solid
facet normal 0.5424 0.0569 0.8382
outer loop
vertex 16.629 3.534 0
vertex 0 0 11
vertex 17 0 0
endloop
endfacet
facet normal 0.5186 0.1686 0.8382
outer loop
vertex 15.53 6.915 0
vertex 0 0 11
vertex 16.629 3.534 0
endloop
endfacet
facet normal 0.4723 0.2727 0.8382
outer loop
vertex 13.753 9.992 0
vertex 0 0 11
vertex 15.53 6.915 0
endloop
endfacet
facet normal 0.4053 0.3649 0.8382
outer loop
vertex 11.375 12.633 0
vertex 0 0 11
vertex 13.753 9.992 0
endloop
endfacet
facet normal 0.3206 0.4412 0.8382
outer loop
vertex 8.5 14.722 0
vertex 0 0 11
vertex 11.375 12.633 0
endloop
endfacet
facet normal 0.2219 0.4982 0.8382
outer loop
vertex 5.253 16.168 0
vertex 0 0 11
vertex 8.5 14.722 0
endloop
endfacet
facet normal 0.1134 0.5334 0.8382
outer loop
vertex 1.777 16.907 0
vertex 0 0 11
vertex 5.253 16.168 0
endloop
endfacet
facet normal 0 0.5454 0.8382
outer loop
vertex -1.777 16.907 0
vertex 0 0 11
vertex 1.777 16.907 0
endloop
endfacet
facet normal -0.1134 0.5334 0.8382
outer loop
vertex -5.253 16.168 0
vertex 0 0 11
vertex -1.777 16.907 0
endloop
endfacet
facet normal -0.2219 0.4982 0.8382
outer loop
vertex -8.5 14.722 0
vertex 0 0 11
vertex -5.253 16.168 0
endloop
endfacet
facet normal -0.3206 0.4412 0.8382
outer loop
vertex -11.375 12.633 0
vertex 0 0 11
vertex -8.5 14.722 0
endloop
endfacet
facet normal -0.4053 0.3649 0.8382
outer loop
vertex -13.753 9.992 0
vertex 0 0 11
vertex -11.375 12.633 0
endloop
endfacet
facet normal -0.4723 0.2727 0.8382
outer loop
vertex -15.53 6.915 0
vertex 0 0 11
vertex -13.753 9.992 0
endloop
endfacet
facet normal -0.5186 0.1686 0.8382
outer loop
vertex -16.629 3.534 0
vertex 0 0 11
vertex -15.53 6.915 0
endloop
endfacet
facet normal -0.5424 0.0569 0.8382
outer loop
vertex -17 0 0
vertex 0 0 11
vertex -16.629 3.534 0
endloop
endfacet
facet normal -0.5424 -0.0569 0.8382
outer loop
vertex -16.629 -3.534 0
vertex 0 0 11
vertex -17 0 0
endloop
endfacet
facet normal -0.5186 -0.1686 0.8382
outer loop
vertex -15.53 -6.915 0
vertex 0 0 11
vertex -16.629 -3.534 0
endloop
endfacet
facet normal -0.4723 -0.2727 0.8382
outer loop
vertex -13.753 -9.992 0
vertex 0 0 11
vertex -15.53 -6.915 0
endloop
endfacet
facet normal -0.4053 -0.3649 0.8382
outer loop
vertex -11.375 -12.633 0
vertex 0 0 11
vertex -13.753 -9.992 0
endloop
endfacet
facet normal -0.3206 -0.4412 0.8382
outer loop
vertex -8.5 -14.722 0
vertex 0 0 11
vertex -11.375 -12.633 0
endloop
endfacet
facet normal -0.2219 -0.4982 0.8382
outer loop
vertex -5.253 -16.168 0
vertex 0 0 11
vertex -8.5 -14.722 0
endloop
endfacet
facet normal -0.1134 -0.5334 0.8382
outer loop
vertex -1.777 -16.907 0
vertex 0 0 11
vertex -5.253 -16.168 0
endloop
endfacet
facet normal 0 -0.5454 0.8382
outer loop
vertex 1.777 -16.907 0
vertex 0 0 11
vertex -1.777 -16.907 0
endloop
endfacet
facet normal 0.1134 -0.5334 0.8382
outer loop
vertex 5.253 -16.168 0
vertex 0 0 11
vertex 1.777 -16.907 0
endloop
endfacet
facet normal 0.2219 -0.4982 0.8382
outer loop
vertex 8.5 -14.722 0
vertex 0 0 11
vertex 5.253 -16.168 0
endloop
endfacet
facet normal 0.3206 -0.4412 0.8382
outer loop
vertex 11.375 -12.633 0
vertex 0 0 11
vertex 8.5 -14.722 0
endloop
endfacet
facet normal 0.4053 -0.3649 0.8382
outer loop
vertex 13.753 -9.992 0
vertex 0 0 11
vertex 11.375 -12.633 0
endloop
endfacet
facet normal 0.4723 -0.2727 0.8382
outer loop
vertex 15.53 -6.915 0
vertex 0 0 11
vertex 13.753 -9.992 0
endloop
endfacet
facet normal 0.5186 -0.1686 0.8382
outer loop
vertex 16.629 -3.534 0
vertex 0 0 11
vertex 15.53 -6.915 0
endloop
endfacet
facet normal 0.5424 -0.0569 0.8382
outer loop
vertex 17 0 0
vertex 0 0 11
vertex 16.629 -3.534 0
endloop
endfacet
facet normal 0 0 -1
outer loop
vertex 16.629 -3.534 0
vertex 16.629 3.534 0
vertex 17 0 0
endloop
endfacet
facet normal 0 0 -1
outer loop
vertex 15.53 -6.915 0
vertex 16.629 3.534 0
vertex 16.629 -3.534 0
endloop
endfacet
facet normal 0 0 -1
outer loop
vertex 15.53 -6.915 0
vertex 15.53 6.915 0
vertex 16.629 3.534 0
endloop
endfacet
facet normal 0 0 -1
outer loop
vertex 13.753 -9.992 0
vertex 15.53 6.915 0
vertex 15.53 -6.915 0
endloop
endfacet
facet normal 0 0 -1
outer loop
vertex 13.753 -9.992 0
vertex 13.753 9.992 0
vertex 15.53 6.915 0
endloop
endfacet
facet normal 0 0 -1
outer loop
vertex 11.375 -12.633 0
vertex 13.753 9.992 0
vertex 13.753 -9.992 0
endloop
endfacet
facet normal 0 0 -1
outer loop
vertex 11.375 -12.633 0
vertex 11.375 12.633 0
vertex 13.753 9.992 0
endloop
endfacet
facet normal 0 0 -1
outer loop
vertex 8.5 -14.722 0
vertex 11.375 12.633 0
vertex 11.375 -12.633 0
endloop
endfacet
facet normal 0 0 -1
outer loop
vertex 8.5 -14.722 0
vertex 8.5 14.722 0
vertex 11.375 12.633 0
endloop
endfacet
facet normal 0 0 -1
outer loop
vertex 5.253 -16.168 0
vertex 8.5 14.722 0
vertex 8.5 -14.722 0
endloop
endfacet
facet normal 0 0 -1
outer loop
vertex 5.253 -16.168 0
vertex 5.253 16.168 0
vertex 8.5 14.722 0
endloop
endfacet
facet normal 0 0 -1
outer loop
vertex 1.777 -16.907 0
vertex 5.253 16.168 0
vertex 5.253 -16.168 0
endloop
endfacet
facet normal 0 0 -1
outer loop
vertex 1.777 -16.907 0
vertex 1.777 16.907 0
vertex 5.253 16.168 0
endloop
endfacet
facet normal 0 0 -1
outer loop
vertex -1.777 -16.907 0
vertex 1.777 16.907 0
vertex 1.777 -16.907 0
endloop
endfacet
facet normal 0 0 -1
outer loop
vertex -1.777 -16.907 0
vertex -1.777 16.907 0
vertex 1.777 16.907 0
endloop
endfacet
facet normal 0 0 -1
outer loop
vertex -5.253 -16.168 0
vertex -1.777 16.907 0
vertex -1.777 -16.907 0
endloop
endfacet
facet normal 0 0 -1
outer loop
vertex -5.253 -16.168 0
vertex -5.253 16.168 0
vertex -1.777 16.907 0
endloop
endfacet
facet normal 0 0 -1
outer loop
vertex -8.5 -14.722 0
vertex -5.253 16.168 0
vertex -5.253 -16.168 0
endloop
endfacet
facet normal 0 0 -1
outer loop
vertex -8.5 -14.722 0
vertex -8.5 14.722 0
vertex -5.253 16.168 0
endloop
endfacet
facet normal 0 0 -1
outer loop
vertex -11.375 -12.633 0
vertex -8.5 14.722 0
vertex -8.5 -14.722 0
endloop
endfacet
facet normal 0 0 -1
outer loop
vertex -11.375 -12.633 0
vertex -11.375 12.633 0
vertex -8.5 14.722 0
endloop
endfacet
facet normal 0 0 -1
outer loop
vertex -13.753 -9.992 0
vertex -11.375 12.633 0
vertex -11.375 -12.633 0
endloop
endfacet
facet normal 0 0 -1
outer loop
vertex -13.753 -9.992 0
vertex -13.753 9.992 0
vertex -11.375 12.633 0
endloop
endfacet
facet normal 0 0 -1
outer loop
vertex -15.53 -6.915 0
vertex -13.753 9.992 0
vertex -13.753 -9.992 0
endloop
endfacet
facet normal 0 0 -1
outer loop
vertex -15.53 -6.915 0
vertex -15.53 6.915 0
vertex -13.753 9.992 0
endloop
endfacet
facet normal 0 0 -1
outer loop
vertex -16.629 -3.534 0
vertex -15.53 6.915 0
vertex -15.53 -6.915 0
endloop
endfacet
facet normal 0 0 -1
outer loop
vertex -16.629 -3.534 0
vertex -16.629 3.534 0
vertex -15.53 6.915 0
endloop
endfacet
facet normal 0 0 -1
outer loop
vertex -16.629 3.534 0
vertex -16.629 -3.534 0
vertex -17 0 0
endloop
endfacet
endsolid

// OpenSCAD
// Generated by SolidPython 1.0.1 on 2020-07-29 00:39:25


cylinder(h = 11, r1 = 17, r2 = 0);
/***********************************************
*********      SolidPython code:      **********
************************************************
 
# import packages: SolidPython
from solid import *
from solid.utils import *
from itertools import chain, combinations


class Resize:

    def __init__(self, scad_file):
        self.scad_file = scad_file
        #self.scad_file = import_scad(scad_file)
        # cone/cylinder param:
        self.r1 = 0
        self.r2 = 0
        self.h = 0
        # rectangular prism param:
        self.w = 0
        self.l = 0
        # ellipse param:
        self.r = 0

    # import OpenScad code (file name corresponds to shape)


    # classify shape + parameters
    def assign(self, param1, param2, param3):
        if self.scad_file == 'cone.scad':
            self.r1 = param1
            self.r2 = param2
            self.h = param3
        elif self.scad_file == 'cylinder.scad':
            self.r1 = param1
            self.r2 = param2
            self.h = param3
        elif self.scad_file == 'rectangularPrism.scad':
            self.h = param1
            self.l = param2
            self.w = param3
        else:
            self.r = param1
            self.h = param2

    # resize parameters
    def iterate(self):
        x = range(3, 20, 2)
        i = 1
        if self.scad_file == 'cone.scad':
            tempList = list(combinations(x, 2))
            for temp in tempList:
                param1 = temp[0]
                param2 = temp[1]
                filepath = 'produced_scad_files/' + 'cone' + str(param1) + '_' + str(param2) + '_' + '.scad'
                scad_render_to_file(cylinder(h=param1, r1=param2, r2=0), filepath)

        elif self.scad_file == 'cylinder.scad':
            tempList = list(combinations(x, 3))
            for temp in tempList:
                param1 = temp[0]
                param2 = temp[1]
                filepath = 'produced_scad_files/' + 'cylinder' + str(param1) + '_' + str(param2) + '_' + '.scad'
                scad_render_to_file(cylinder(h=param1, r1=param2, r2=param2), filepath)

        elif self.scad_file == 'rectangularPrism.scad':
            tempList = list(combinations(x, 3))
            for temp in tempList:
                param1 = temp[0]
                param2 = temp[1]
                param3 = temp[2]
                filepath = 'produced_scad_files/' + 'rectangularPrism' + str(param1) + '_' + str(param2) + '_' + str(
                    param3) + '.scad'
                scad_render_to_file(cube(size=(param1, param2, param3)), filepath)

        elif self.scad_file == 'ellipse.scad':
            tempList = list(combinations(x, 4))
            for temp in tempList:
                param1 = temp[0]
                param2 = temp[1]
                param3 = temp[2]
                param4 = temp[3]
                filepath = 'produced_scad_files/' + 'ellipse' + str(param1) + '_' + str(param2) + '_' + str(param3) + '_' + str(param4) + '.scad'
                scad_render_to_file(scale([param1, param2, param3])(sphere(r=param4)), filepath)

    def render_to_scadfile(self):
        scad_render_to_file(scad, 'example.scad') 
 
************************************************/
